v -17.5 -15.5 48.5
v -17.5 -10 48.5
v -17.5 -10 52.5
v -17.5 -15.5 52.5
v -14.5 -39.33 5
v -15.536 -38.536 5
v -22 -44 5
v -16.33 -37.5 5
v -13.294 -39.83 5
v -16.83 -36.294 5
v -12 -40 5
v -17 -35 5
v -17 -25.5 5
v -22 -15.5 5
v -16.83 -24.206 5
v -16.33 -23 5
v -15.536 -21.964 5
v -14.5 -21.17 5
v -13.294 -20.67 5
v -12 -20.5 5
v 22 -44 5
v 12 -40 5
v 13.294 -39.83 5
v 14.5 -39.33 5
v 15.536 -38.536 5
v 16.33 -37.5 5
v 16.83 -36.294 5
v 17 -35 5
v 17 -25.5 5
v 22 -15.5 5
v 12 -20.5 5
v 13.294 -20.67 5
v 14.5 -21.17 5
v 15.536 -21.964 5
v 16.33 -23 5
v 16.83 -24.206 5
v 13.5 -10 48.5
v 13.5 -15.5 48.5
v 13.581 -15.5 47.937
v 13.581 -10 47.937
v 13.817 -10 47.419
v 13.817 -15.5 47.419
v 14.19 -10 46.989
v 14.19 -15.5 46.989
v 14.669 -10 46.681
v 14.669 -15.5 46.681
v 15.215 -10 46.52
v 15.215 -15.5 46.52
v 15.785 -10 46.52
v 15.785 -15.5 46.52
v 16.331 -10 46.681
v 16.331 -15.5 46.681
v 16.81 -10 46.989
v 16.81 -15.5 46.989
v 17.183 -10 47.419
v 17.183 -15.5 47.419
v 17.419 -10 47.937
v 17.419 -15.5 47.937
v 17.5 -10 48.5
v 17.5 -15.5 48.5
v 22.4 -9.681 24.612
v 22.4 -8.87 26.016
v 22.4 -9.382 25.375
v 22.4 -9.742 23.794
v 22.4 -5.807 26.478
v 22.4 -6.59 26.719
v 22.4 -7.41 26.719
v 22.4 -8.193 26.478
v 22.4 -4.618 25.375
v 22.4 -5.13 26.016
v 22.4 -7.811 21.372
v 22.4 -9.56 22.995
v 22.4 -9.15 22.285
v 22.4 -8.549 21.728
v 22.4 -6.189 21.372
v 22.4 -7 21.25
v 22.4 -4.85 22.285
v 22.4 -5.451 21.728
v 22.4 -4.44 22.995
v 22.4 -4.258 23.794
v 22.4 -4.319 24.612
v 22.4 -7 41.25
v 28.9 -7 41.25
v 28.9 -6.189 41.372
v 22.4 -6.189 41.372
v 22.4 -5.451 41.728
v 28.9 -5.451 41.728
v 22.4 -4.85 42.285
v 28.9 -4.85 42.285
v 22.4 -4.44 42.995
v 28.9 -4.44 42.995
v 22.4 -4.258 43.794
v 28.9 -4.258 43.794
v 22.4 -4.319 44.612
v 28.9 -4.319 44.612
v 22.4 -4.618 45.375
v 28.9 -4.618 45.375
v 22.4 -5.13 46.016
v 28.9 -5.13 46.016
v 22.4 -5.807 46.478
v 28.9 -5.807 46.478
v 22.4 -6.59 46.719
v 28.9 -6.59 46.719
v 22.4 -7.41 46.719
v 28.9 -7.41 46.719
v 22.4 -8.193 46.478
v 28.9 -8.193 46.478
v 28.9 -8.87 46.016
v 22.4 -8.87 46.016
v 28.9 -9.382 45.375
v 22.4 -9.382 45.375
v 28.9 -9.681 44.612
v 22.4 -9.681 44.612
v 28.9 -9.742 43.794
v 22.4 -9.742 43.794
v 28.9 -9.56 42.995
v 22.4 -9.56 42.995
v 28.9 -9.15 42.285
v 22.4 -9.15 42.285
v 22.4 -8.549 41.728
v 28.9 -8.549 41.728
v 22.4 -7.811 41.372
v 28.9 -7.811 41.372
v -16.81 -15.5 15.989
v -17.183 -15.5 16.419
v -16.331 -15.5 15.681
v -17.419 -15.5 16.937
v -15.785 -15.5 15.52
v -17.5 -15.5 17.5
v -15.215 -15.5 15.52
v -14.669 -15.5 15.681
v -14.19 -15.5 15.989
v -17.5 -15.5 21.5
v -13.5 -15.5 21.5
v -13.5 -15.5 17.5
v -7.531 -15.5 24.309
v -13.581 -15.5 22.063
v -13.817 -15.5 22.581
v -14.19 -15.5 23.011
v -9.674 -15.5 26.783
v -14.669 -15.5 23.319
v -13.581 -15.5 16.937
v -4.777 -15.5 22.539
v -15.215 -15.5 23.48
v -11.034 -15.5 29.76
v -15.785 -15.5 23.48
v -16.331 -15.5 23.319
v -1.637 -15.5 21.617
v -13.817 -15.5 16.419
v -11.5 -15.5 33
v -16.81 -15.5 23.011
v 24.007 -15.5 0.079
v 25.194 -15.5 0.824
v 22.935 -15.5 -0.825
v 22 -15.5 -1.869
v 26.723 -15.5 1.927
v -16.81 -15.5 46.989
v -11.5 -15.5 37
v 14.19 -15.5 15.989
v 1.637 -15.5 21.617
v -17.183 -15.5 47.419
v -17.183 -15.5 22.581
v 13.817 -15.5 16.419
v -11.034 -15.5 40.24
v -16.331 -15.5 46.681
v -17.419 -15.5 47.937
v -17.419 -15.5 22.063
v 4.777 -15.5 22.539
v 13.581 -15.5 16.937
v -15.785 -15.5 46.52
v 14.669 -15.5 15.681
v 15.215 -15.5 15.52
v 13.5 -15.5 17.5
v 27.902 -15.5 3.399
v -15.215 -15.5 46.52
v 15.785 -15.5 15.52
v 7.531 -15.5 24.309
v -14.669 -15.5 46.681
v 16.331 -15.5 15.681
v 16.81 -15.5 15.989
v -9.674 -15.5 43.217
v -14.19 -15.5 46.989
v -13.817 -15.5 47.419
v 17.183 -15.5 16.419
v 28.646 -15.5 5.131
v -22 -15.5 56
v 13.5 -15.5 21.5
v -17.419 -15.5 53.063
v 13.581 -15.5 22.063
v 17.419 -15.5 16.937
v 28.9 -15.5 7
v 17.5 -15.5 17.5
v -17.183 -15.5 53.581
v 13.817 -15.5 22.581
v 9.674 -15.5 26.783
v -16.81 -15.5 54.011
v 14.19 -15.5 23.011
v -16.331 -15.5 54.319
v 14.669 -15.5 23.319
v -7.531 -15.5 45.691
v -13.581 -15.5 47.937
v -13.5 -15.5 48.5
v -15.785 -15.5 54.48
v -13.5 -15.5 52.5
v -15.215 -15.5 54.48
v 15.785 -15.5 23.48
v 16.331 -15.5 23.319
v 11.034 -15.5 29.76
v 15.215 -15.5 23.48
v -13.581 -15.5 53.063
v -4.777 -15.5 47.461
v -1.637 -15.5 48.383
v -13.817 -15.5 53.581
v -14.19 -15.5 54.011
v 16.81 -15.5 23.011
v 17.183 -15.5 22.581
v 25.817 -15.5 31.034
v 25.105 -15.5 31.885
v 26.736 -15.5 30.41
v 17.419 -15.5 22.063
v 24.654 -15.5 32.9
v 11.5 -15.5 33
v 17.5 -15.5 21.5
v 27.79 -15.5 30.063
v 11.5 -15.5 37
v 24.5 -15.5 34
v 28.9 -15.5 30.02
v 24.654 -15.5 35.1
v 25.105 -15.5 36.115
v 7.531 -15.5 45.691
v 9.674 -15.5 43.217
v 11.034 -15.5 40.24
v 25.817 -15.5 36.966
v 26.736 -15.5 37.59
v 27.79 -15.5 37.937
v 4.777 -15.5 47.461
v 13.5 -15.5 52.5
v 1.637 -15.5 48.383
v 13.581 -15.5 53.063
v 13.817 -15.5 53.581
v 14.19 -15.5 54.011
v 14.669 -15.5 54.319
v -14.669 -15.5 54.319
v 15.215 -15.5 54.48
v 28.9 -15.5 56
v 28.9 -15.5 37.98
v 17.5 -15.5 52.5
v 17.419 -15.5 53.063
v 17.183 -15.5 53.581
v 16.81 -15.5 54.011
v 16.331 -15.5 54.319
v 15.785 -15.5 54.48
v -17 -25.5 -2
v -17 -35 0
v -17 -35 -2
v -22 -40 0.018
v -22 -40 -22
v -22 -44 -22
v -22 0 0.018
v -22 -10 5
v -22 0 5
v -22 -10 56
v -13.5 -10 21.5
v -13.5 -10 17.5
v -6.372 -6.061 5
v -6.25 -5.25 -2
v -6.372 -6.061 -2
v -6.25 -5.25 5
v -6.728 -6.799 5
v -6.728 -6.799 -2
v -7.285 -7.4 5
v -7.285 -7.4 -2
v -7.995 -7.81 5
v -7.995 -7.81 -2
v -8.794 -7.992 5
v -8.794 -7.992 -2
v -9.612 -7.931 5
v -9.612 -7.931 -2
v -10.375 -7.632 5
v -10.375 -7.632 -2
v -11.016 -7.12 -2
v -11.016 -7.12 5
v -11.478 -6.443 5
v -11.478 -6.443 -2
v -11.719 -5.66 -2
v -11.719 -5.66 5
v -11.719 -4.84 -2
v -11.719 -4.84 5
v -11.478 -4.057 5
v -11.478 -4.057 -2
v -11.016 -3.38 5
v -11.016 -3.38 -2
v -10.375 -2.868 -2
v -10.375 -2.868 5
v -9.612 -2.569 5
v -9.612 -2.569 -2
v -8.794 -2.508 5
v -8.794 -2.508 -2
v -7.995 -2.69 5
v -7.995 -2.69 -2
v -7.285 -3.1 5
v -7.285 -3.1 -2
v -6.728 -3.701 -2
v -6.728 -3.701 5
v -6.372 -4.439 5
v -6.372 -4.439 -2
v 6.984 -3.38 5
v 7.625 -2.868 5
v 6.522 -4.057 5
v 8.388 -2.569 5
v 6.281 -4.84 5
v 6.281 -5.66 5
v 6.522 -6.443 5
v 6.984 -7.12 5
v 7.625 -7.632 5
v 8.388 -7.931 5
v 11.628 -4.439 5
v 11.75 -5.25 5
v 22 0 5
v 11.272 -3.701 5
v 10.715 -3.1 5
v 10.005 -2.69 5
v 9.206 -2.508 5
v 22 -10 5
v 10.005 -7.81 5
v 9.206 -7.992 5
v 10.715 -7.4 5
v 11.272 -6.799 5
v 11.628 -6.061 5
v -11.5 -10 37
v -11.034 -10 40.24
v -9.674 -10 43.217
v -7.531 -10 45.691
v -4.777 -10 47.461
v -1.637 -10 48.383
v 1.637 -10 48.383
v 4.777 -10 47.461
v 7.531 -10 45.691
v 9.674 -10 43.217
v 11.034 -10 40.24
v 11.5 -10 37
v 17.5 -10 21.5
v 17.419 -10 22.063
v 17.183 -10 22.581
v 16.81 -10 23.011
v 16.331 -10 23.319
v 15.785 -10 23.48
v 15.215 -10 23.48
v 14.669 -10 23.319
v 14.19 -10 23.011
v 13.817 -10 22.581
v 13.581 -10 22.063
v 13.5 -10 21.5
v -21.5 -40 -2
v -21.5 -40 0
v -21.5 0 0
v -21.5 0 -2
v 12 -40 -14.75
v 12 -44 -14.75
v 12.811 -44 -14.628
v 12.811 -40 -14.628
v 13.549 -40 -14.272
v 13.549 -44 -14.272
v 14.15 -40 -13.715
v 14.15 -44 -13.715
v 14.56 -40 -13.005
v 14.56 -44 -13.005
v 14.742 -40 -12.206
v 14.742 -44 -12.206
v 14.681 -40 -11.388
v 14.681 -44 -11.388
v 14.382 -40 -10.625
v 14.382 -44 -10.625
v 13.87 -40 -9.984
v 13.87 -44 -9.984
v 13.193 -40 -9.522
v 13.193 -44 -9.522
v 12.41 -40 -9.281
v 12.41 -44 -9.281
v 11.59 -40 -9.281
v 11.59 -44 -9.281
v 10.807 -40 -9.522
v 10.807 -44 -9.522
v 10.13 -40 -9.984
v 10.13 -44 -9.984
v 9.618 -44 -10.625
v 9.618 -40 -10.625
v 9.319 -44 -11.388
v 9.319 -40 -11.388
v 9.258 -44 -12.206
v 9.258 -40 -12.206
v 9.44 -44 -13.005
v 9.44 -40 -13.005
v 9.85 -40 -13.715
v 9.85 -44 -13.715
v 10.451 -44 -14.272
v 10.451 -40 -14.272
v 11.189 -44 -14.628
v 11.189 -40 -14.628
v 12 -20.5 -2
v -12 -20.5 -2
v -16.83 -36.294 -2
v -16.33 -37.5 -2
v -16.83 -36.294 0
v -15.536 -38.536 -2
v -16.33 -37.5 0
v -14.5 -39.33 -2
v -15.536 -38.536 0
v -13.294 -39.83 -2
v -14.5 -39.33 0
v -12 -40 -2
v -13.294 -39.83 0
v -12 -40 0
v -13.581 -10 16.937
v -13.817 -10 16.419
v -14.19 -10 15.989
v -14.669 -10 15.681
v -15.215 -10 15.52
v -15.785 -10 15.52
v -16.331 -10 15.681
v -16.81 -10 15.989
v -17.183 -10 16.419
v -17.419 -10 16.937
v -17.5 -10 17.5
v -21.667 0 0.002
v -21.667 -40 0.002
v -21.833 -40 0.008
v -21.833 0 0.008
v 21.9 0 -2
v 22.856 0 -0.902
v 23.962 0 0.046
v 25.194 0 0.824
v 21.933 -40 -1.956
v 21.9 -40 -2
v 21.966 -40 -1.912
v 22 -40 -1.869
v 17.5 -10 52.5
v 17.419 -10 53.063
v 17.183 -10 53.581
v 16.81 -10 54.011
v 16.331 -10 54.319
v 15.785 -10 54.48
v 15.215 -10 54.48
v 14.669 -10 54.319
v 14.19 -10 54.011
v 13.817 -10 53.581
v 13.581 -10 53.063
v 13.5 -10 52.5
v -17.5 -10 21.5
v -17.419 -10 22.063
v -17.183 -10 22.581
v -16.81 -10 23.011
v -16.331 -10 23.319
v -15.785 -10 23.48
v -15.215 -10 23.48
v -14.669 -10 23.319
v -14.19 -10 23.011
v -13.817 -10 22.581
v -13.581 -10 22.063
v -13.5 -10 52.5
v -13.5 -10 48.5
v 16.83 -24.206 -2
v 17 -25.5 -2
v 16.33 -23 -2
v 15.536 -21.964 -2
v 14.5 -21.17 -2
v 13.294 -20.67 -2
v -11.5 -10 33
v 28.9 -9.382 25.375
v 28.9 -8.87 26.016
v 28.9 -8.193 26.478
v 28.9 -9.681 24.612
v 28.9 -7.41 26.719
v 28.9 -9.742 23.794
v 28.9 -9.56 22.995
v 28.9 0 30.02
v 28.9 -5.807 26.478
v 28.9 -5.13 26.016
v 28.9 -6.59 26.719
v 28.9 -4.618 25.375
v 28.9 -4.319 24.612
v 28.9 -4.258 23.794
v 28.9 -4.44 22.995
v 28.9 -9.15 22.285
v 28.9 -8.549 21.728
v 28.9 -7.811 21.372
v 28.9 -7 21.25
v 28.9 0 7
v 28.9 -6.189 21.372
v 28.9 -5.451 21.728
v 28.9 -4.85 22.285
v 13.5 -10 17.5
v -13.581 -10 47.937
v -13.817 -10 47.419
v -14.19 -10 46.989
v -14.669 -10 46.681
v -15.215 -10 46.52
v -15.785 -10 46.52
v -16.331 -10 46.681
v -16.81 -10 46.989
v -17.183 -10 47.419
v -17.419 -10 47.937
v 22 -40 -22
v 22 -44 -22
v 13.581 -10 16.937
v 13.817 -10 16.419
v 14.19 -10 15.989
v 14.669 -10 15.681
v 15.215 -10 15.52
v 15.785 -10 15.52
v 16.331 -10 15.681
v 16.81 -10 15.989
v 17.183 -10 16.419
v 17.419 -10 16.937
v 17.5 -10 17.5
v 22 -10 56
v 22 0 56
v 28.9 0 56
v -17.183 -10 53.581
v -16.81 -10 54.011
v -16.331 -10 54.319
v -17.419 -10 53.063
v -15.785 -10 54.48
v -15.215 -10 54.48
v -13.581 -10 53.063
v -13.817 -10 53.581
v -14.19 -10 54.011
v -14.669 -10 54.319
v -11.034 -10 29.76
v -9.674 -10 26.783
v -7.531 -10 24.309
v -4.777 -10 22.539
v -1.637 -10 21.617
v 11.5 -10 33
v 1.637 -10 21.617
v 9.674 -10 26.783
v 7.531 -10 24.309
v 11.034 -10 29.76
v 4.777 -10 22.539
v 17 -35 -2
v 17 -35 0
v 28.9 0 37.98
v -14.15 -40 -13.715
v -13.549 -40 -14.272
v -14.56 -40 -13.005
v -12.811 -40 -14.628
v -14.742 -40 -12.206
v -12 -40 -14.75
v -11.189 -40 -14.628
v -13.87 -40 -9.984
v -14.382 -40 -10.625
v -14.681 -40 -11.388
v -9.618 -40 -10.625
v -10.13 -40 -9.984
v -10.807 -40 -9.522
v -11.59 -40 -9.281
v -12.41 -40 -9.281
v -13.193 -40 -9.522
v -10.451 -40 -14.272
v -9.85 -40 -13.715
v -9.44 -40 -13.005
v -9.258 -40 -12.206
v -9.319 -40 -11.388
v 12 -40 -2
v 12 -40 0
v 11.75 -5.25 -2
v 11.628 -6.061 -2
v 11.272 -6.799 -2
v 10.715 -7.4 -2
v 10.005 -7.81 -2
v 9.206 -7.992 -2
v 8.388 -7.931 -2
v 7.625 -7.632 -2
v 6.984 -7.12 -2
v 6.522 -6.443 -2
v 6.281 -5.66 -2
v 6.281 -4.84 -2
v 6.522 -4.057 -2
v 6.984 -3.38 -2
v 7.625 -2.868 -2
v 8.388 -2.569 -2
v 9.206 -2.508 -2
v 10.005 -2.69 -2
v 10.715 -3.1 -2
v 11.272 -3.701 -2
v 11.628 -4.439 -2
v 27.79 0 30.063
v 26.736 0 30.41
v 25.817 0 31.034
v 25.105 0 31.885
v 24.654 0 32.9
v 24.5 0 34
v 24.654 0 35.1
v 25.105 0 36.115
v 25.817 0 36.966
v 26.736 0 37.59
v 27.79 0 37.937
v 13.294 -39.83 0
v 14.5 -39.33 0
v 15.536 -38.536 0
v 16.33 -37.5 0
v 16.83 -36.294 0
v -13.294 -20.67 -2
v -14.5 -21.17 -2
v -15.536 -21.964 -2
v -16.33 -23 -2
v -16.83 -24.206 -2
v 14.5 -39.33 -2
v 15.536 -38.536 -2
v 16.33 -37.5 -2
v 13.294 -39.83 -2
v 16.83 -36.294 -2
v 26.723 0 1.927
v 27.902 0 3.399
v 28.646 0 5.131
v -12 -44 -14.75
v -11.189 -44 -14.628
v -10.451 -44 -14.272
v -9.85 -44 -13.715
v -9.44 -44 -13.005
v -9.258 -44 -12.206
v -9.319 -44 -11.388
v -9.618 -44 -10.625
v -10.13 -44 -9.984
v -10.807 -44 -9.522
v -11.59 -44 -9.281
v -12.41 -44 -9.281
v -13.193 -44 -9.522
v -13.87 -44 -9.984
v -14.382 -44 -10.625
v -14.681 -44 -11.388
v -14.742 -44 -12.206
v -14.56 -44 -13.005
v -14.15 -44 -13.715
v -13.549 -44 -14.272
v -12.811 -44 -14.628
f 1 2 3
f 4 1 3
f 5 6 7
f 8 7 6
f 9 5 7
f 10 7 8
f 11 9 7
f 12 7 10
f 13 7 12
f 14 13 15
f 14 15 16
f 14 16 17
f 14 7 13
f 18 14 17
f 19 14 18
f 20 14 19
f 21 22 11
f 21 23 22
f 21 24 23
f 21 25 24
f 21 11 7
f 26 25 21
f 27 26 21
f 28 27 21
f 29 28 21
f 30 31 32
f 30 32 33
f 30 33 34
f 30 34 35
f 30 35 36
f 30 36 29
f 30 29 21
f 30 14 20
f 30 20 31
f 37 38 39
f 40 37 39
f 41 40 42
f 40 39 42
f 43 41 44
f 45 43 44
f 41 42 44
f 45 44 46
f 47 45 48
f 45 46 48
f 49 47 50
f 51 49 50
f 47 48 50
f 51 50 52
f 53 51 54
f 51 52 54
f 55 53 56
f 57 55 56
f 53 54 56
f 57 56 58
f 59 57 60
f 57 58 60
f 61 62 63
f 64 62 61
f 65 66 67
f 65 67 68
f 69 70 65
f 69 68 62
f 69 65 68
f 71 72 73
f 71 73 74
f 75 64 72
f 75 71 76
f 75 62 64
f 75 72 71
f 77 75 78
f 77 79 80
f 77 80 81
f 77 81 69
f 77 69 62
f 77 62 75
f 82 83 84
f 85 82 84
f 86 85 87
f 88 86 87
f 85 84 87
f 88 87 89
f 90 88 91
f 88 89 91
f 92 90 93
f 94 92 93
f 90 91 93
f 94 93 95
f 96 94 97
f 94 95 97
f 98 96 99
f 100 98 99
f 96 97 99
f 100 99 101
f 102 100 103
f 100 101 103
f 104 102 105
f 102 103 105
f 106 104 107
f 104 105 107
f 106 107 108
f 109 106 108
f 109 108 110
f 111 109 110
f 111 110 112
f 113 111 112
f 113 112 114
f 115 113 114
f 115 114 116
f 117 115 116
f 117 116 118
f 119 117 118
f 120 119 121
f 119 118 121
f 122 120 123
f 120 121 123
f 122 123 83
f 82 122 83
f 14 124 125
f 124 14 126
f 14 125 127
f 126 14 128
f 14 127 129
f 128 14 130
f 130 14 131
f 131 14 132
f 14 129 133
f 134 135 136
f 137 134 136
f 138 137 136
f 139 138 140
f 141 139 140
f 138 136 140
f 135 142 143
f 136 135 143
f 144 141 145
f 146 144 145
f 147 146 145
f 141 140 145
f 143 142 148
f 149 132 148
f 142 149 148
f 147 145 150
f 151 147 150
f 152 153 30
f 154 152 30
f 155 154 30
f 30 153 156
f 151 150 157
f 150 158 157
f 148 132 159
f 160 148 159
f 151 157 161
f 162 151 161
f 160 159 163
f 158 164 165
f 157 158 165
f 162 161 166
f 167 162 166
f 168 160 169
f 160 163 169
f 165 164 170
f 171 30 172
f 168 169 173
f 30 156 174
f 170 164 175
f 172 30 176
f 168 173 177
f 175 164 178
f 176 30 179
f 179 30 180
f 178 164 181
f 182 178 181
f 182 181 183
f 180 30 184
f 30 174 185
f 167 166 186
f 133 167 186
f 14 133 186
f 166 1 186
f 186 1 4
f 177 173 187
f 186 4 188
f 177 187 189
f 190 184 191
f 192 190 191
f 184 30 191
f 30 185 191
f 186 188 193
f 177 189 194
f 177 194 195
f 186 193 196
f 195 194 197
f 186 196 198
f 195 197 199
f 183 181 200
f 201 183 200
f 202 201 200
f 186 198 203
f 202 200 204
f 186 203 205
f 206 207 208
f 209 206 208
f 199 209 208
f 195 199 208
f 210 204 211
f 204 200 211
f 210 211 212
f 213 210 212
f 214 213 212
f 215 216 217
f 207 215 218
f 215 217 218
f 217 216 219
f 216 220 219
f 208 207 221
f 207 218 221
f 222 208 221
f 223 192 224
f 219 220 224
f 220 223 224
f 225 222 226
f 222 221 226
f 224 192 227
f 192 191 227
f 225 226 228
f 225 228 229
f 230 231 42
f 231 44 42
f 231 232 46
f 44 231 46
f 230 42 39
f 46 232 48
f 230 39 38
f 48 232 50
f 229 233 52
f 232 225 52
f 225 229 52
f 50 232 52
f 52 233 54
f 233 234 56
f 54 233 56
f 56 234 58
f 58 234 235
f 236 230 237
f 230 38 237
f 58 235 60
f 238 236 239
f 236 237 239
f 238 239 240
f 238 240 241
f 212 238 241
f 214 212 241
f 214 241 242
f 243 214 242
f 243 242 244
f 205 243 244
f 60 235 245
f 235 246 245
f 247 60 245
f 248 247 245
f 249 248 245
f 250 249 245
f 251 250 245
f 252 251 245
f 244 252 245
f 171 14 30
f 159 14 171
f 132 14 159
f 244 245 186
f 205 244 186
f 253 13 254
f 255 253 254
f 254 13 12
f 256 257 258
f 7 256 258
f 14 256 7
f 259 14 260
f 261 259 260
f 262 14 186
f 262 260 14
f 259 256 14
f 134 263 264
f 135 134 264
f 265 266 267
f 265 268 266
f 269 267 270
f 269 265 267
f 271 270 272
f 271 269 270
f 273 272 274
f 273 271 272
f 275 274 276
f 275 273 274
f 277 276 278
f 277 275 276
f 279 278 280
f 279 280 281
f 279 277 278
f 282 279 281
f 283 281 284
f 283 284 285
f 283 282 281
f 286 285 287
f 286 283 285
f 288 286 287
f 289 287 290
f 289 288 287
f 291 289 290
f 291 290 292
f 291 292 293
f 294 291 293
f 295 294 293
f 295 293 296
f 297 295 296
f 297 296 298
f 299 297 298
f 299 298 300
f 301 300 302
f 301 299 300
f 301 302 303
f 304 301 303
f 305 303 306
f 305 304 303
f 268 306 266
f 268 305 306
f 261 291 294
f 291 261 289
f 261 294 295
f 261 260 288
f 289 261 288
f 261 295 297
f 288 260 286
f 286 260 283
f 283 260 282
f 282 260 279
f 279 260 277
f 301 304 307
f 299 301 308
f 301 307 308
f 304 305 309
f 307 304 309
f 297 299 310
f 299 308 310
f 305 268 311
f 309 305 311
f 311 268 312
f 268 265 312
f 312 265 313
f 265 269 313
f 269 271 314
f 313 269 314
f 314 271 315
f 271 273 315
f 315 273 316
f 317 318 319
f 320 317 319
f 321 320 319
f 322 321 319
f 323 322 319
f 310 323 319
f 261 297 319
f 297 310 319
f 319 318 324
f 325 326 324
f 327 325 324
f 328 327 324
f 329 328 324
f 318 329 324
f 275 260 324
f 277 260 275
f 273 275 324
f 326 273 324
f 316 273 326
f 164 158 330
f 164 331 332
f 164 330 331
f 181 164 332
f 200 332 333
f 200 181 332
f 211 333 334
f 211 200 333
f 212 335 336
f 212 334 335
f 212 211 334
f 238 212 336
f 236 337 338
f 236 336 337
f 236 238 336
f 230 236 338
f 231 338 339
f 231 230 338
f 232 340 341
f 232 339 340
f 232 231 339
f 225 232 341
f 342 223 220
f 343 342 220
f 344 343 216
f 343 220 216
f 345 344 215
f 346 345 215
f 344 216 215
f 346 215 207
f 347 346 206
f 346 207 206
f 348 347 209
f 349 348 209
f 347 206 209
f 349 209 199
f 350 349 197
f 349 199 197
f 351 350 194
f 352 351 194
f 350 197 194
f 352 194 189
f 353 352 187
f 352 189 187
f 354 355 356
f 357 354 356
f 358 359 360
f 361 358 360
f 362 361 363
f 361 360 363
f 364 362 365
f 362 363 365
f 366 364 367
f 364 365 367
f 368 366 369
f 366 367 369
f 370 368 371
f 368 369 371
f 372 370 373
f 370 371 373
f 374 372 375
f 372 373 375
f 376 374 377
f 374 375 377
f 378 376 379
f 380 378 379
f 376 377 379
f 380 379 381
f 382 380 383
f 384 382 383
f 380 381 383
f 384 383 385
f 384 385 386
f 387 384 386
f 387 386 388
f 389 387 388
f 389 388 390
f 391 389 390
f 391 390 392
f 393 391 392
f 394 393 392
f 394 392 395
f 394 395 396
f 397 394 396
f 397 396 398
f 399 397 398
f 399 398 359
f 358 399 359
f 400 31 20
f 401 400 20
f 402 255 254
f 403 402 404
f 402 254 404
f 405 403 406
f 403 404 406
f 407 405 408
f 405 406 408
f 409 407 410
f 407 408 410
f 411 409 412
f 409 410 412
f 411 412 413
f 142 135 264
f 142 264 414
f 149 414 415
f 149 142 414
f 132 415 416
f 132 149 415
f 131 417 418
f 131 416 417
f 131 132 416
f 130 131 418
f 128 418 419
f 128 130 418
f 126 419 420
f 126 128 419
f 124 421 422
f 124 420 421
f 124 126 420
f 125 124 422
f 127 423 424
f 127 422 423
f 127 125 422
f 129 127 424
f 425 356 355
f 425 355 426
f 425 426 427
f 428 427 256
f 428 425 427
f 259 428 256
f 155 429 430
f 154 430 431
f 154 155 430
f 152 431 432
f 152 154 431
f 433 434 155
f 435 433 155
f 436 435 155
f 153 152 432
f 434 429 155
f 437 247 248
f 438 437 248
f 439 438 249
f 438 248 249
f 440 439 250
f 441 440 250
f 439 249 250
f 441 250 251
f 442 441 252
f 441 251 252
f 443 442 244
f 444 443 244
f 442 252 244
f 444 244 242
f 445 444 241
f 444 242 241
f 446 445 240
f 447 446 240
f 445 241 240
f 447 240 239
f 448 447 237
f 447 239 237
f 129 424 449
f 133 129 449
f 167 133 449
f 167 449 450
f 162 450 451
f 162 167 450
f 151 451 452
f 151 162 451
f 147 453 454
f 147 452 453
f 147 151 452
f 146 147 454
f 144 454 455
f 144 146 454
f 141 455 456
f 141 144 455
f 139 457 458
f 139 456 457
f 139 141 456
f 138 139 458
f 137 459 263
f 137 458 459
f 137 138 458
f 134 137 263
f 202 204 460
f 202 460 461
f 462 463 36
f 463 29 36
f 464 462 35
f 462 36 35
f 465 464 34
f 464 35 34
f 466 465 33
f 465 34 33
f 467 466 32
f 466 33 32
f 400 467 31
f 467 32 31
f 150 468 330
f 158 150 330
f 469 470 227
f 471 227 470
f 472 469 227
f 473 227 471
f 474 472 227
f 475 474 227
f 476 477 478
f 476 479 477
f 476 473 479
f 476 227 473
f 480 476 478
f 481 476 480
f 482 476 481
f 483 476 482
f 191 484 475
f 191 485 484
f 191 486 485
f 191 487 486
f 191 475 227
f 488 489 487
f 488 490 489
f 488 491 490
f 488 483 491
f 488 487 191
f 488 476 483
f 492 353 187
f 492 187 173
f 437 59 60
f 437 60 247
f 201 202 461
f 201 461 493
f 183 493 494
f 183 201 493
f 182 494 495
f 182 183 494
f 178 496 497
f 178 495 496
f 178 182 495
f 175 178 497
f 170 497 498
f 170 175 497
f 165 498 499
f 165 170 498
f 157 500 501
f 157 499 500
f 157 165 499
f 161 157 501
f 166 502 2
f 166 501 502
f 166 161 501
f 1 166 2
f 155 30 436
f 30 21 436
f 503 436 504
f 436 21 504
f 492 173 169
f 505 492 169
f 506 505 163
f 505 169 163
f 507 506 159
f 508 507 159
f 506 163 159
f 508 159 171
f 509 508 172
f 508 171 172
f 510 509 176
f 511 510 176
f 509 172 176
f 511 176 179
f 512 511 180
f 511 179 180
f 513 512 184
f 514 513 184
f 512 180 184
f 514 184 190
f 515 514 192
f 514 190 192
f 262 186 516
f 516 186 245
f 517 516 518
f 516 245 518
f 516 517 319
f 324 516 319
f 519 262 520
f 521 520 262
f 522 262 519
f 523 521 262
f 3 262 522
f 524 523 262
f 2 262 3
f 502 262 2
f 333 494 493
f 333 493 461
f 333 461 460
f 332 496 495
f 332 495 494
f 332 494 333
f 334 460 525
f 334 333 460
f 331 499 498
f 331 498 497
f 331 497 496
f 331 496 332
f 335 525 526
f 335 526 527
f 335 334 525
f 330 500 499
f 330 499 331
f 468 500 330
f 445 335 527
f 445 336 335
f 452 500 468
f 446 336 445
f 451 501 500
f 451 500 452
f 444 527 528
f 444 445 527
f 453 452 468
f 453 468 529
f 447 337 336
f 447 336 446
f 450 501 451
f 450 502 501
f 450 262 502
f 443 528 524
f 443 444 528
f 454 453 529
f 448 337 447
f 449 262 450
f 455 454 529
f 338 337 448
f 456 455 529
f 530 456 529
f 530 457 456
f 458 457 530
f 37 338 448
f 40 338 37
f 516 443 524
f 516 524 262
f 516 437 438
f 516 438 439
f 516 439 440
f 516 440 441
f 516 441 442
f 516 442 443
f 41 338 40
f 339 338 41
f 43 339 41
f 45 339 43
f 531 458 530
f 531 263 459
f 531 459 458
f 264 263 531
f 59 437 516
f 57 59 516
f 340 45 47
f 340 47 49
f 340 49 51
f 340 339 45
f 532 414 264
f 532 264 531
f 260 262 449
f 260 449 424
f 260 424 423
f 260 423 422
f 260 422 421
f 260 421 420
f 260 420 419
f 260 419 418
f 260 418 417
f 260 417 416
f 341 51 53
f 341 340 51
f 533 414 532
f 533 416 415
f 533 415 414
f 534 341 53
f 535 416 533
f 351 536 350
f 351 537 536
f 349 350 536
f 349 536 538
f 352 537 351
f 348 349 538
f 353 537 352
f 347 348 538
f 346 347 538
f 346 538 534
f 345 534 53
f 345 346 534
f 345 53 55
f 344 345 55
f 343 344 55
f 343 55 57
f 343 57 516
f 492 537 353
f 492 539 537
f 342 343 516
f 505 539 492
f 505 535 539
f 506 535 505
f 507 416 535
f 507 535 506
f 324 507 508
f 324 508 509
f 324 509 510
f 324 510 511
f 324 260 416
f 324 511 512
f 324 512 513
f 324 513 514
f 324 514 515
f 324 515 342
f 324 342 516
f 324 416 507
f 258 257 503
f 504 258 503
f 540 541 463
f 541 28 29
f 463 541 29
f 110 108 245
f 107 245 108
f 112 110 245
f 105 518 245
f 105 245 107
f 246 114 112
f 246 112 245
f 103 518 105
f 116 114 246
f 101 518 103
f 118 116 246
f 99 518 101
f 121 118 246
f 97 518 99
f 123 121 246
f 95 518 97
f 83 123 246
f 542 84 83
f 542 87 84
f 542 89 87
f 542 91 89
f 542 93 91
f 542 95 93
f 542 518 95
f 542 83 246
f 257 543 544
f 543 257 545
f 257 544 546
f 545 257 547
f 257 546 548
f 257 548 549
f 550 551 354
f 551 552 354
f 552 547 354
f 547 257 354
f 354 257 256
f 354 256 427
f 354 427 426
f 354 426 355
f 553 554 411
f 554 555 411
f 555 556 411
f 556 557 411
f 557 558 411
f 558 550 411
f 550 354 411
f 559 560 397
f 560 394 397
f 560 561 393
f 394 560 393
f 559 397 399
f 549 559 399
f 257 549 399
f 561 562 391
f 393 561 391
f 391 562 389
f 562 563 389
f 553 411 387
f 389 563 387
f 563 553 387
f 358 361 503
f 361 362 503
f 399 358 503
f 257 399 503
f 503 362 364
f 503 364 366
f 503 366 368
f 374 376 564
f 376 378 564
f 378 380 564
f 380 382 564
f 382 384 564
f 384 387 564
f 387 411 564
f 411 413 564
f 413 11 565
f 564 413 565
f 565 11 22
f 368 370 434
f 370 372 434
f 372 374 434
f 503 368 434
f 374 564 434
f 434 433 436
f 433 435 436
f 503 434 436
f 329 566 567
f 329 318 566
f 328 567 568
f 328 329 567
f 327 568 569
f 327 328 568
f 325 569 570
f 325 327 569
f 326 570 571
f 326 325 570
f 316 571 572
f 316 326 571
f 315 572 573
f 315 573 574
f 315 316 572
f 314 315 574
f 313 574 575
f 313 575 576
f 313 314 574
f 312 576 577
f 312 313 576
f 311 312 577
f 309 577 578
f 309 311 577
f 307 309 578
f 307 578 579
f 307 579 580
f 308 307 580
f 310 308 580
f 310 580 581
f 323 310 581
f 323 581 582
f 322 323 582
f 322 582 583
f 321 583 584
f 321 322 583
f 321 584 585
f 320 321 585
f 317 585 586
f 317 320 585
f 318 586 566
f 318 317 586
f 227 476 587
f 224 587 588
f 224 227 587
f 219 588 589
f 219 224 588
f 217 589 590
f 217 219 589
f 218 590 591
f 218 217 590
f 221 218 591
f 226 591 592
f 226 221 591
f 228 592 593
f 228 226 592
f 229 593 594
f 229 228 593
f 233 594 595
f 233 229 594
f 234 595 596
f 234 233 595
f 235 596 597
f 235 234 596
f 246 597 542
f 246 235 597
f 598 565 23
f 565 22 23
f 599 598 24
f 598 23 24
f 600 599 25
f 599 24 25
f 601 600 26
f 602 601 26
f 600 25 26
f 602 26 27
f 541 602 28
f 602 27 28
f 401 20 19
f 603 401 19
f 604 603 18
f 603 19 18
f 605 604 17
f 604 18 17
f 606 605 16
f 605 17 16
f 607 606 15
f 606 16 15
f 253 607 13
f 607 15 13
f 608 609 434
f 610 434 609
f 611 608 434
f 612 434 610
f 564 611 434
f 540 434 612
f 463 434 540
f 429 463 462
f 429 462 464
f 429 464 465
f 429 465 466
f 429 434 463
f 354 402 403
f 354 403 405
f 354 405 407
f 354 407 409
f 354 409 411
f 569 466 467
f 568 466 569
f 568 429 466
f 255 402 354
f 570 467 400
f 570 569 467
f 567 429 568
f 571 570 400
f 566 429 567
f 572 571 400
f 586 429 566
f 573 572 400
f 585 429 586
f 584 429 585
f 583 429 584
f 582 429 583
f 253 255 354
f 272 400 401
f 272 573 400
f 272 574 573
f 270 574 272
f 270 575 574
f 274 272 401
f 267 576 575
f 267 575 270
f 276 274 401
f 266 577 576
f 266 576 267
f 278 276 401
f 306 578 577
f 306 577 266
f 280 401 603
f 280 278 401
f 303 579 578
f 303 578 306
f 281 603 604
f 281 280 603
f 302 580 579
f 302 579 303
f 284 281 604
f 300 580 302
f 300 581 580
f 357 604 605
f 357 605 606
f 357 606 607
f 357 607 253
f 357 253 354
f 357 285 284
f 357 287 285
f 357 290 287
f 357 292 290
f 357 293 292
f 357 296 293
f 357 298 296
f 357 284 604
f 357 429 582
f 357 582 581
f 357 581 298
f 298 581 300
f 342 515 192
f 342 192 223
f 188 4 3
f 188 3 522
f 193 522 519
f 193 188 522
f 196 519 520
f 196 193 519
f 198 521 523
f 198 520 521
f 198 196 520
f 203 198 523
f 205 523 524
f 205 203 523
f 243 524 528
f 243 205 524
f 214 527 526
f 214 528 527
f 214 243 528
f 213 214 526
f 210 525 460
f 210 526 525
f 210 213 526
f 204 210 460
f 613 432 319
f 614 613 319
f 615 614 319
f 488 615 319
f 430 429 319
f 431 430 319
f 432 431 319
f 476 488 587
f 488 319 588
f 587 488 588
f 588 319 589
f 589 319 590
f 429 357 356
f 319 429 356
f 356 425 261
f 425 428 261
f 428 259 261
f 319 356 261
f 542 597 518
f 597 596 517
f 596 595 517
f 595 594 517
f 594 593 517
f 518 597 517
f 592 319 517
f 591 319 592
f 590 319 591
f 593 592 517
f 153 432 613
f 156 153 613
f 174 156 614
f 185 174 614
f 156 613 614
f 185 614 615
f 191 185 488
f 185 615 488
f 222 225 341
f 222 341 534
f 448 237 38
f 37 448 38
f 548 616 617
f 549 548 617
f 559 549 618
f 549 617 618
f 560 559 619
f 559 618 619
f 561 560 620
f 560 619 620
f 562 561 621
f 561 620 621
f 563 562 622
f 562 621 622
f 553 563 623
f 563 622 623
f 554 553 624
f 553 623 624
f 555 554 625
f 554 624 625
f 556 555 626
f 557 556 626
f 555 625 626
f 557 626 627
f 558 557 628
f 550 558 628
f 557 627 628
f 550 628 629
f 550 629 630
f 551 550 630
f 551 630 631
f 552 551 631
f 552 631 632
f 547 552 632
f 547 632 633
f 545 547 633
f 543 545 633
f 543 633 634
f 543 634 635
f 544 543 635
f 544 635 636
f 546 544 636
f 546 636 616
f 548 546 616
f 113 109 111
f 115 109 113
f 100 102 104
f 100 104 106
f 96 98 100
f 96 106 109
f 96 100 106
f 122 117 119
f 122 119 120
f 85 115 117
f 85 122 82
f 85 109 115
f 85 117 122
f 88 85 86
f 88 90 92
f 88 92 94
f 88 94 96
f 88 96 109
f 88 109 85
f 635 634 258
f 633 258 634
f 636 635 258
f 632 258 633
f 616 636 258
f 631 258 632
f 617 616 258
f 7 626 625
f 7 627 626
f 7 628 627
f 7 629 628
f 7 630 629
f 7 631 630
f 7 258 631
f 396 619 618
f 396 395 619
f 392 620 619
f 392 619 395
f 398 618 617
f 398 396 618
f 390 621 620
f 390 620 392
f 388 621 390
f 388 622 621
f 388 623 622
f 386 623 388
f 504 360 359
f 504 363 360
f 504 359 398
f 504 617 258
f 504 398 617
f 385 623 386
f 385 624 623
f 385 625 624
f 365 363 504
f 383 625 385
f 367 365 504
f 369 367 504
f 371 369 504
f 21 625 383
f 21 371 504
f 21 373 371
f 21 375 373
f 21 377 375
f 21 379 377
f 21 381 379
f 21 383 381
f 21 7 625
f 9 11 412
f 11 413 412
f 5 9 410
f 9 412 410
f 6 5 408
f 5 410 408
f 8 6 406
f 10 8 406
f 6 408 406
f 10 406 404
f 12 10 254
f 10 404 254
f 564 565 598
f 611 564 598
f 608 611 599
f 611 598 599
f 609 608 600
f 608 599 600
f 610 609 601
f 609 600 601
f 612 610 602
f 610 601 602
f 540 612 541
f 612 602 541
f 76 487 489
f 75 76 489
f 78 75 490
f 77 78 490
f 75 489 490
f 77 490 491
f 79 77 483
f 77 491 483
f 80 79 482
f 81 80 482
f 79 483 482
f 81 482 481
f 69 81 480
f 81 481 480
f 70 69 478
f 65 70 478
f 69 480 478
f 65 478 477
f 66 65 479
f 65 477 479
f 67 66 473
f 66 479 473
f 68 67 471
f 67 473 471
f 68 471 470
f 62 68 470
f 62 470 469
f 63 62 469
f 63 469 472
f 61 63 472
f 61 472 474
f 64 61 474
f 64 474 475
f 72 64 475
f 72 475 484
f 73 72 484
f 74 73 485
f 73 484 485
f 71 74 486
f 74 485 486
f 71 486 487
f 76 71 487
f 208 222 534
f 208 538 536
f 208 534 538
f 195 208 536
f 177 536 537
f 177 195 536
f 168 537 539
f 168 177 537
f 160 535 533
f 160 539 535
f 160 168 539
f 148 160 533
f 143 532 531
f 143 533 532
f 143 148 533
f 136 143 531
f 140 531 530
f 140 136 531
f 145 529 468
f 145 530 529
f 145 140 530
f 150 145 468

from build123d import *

# Parameters (mm, degrees)
BOSS_EXTRUDE1_DEPTH      = 42
BOSS_EXTRUDE1_DEPTH_BACK = 42
SKETCH2_R                = 2.75
SKETCH2_W                = 15
SKETCH2_H                = 2.5
CUT_EXTRUDE1_DEPTH       = 100.161484458
SKETCH3_R                = 4
SKETCH3_W                = 15
SKETCH3_H                = 60
CUT_EXTRUDE2_DEPTH       = 101.743486312
SKETCH4_W                = 44
SKETCH4_H                = 46.5
CUT_EXTRUDE3_DEPTH       = 60
CUT_EXTRUDE4_DEPTH       = 10
CUT_EXTRUDE4_DEPTH_BACK  = 10
SKETCH5_W                = 44
SKETCH5_H                = 51
SKETCH6_R                = 2.75
CUT_EXTRUDE5_DEPTH       = 4.6
SKETCH7_W                = 15
SKETCH7_H                = 62
CUT_EXTRUDE6_DEPTH       = 63
SKETCH8_W                = 54
SKETCH8_H                = 22
CUT_EXTRUDE7_DEPTH       = 63
SKETCH9_W                = 54
SKETCH9_H                = 27
BOSS_EXTRUDE2_DEPTH      = 4
FILLET1_R                = 5
SKETCH12_W               = 5
SKETCH12_H               = 11.450523872
BOSS_EXTRUDE4_DEPTH      = 4
CUT_EXTRUDE8_START       = -113
SKETCH13_R               = 65
CUT_EXTRUDE8_DEPTH       = 113
SKETCH14_R               = 2.75
CUT_EXTRUDE9_DEPTH       = 15
SKETCH15_R               = 2.75
CUT_EXTRUDE10_DEPTH      = 15
SKETCH16_W               = 5
SKETCH16_H               = 46.5
CUT_EXTRUDE11_DEPTH      = 90
SKETCH17_W               = 9
SKETCH17_H               = 18
CUT_EXTRUDE12_DEPTH      = 90
SKETCH23_W               = 56
SKETCH23_H               = 15.5
BOSS_EXTRUDE10_DEPTH     = 6.9
SKETCH18_W               = 56
SKETCH18_H               = 15.5
SKETCH18_R               = 2.75
BOSS_EXTRUDE5_DEPTH      = 6.5
SKETCH19_R               = 4
CUT_EXTRUDE13_DEPTH      = 36
FILLET2_R                = 7
FILLET5_R                = 7
SKETCH24_R               = 2.75
CUT_EXTRUDE14_DEPTH      = 6.5
SKETCH26_W               = 56
SKETCH26_H               = 15.5
CUT_EXTRUDE15_DEPTH      = 6.5
SKETCH27_R               = 2.75
BOSS_EXTRUDE11_DEPTH     = 2
FILLET6_R                = 10


with BuildPart() as part:
    # Sketch1 → Boss-Extrude1 (new, two sides: drawn at the far end of the back side and taken through both)
    with BuildSketch(Plane(origin=(0, 0, 0), x_dir=(0, 0, -1), z_dir=(1, 0, 0)).offset(-BOSS_EXTRUDE1_DEPTH_BACK)):
        with BuildLine():
            Line((0, 0), (0, -62))
            Line((0, -62), (-5, -62))
            ThreePointArc((-5, -62), (-27.506882202, -29.081460906), (-65, -15.5))
            Line((-65, -15.5), (-65, 2.5))
            Line((-65, 2.5), (-56, 2.5))
            ThreePointArc((-56, 2.5), (-30.901836055, -6.947455525), (-5, 0))
            Line((-5, 0), (0, 0))
        make_face()
    extrude(amount=BOSS_EXTRUDE1_DEPTH + BOSS_EXTRUDE1_DEPTH_BACK)

    # Sketch2 → Cut-Extrude1 (cut, through all)
    with BuildSketch(Plane(origin=(0, 0, 0), x_dir=(-1, 0, 0), z_dir=(0, 0, -1))):
        with Locations(Location((-36, -6, 0), (0, 0, 90))):
            Circle(SKETCH2_R)
        with BuildLine():
            ThreePointArc((-42, -53.6792), (-32.778829166, -31), (-42, -8.3208))
            Line((-42, -8.3208), (-42, -53.6792))
        make_face()
        with BuildLine():
            ThreePointArc((-17, -25.5), (-15.535533906, -21.964466094), (-12, -20.5))
            Line((-12, -20.5), (12, -20.5))
            ThreePointArc((12, -20.5), (15.535533906, -21.964466094), (17, -25.5))
            Line((17, -25.5), (17, -49))
            ThreePointArc((17, -49), (15.535533906, -52.535533906), (12, -54))
            Line((12, -54), (-12, -54))
            ThreePointArc((-12, -54), (-15.535533906, -52.535533906), (-17, -49))
            Line((-17, -49), (-17, -25.5))
        make_face()
        with Locations(Location((-36, -56, 0), (0, 0, 90))):
            Circle(SKETCH2_R)
        with Locations(Location((36, -56, 0), (0, 0, 90))):
            Circle(SKETCH2_R)
        with Locations(Location((36, -6, 0), (0, 0, 90))):
            Circle(SKETCH2_R)
        with Locations((34.5, 1.25)):
            Rectangle(SKETCH2_W, SKETCH2_H)
        with Locations((-34.5, 1.25)):
            Rectangle(SKETCH2_W, SKETCH2_H)
        with BuildLine():
            Line((42, -53.6792), (42, -8.3208))
            ThreePointArc((42, -8.3208), (32.778829166, -31), (42, -53.6792))
        make_face()
    extrude(amount=-CUT_EXTRUDE1_DEPTH, mode=Mode.SUBTRACT)

    # Sketch3 → Cut-Extrude2 (cut, through all)
    with BuildSketch(Plane(origin=(0, -62, 0), x_dir=(-1, 0, 0), z_dir=(0, -1, 0))):
        with Locations((0, -65)):
            Circle(SKETCH3_R)
        with Locations((34.5, -35)):
            Rectangle(SKETCH3_W, SKETCH3_H)
        with Locations((-34.5, -35)):
            Rectangle(SKETCH3_W, SKETCH3_H)
        with BuildLine():
            Line((11.5, -33), (11.5, -37))
            ThreePointArc((11.5, -37), (0, -48.5), (-11.5, -37))
            Line((-11.5, -37), (-11.5, -33))
            ThreePointArc((-11.5, -33), (0, -21.5), (11.5, -33))
        make_face()
        with BuildLine():
            Line((17.5, -48.5), (17.5, -52.5))
            ThreePointArc((17.5, -52.5), (15.5, -54.5), (13.5, -52.5))
            Line((13.5, -52.5), (13.5, -48.5))
            ThreePointArc((13.5, -48.5), (15.5, -46.5), (17.5, -48.5))
        make_face()
        with BuildLine():
            Line((17.5, -17.5), (17.5, -21.5))
            ThreePointArc((17.5, -21.5), (15.5, -23.5), (13.5, -21.5))
            Line((13.5, -21.5), (13.5, -17.5))
            ThreePointArc((13.5, -17.5), (15.5, -15.5), (17.5, -17.5))
        make_face()
        with BuildLine():
            Line((-17.5, -17.5), (-17.5, -21.5))
            ThreePointArc((-17.5, -21.5), (-15.5, -23.5), (-13.5, -21.5))
            Line((-13.5, -21.5), (-13.5, -17.5))
            ThreePointArc((-13.5, -17.5), (-15.5, -15.5), (-17.5, -17.5))
        make_face()
        with BuildLine():
            Line((-17.5, -48.5), (-17.5, -52.5))
            ThreePointArc((-17.5, -52.5), (-15.5, -54.5), (-13.5, -52.5))
            Line((-13.5, -52.5), (-13.5, -48.5))
            ThreePointArc((-13.5, -48.5), (-15.5, -46.5), (-17.5, -48.5))
        make_face()
    extrude(amount=-CUT_EXTRUDE2_DEPTH, mode=Mode.SUBTRACT)

    # Sketch4 → Cut-Extrude3 (cut)
    with BuildSketch(Plane.XY.offset(65)):
        with Locations((0, -38.75)):
            Rectangle(SKETCH4_W, SKETCH4_H)
    extrude(amount=-CUT_EXTRUDE3_DEPTH, mode=Mode.SUBTRACT)

    # Sketch5 → Cut-Extrude4 (cut, two sides: drawn at the far end of the back side and taken through both)
    with BuildSketch(Plane(origin=(0, 0, 0), x_dir=(1, 0, 0), z_dir=(0, 1, 0)).offset(-CUT_EXTRUDE4_DEPTH_BACK)):
        with Locations((0, -30.5)):
            Rectangle(SKETCH5_W, SKETCH5_H)
    extrude(amount=CUT_EXTRUDE4_DEPTH + CUT_EXTRUDE4_DEPTH_BACK, mode=Mode.SUBTRACT)

    # Sketch6 → Cut-Extrude5 (cut)
    with BuildSketch(Plane.XY.offset(65)):
        with Locations((-10, -5.5)):
            Circle(SKETCH6_R)
        with Locations((10, -5.5)):
            Circle(SKETCH6_R)
    extrude(amount=-CUT_EXTRUDE5_DEPTH, mode=Mode.SUBTRACT)

    # Sketch7 → Cut-Extrude6 (cut)
    with BuildSketch(Plane.XY.offset(5)):
        with Locations((34.5, -31)):
            Rectangle(SKETCH7_W, SKETCH7_H)
        with Locations((-34.5, -31)):
            Rectangle(SKETCH7_W, SKETCH7_H)
    extrude(amount=-CUT_EXTRUDE6_DEPTH, mode=Mode.SUBTRACT)

    # Sketch8 → Cut-Extrude7 (cut)
    with BuildSketch(Plane(origin=(0, 0, 0), x_dir=(-1, 0, 0), z_dir=(0, 0, -1))):
        with Locations((0, -51)):
            Rectangle(SKETCH8_W, SKETCH8_H)
    extrude(amount=-CUT_EXTRUDE7_DEPTH, mode=Mode.SUBTRACT)

    # Sketch9 → Boss-Extrude2 (add)
    with BuildSketch(Plane.XZ.offset(40)):
        with Locations((0, -8.5)):
            Rectangle(SKETCH9_W, SKETCH9_H)
    extrude(amount=BOSS_EXTRUDE2_DEPTH)

    # Fillet1
    fillet1_edges = [part.edges().sort_by_distance(p)[0] for p in [
        (17, -40, 2.5),
        (-17, -40, 2.5),
    ]]
    fillet(fillet1_edges, radius=FILLET1_R)

    # Sketch12 → Boss-Extrude4 (add)
    with BuildSketch(Plane.XZ.offset(40)):
        with Locations((-24.5, 10.725261936)):
            Rectangle(SKETCH12_W, SKETCH12_H)
        with Locations((24.5, 10.725261936)):
            Rectangle(SKETCH12_W, SKETCH12_H)
    extrude(amount=BOSS_EXTRUDE4_DEPTH)

    # Sketch13 → Cut-Extrude8 (cut)
    with BuildSketch(Plane(origin=(27, 0, 0), x_dir=(0, 0, -1), z_dir=(1, 0, 0)).offset(CUT_EXTRUDE8_START)):
        with Locations((-67.324040456, -80.458439297)):
            Circle(SKETCH13_R)
    extrude(amount=CUT_EXTRUDE8_DEPTH, mode=Mode.SUBTRACT)

    # Sketch14 → Cut-Extrude9 (cut)
    with BuildSketch(Plane.XZ.offset(44)):
        with Locations(Location((12, -12, 0), (0, 0, 270))):
            Circle(SKETCH14_R)
        with Locations(Location((-12, -12, 0), (0, 0, 270))):
            Circle(SKETCH14_R)
    extrude(amount=-CUT_EXTRUDE9_DEPTH, mode=Mode.SUBTRACT)

    # Sketch15 → Cut-Extrude10 (cut)
    with BuildSketch(Plane.XY.offset(5)):
        with Locations((9, -5.25)):
            Circle(SKETCH15_R)
        with Locations((-9, -5.25)):
            Circle(SKETCH15_R)
    extrude(amount=-CUT_EXTRUDE10_DEPTH, mode=Mode.SUBTRACT)

    # Sketch16 → Cut-Extrude11 (cut)
    with BuildSketch(Plane.XY.offset(65)):
        with Locations((-24.5, -20.75)):
            Rectangle(SKETCH16_W, SKETCH16_H)
        with Locations((24.5, -20.75)):
            Rectangle(SKETCH16_W, SKETCH16_H)
    extrude(amount=-CUT_EXTRUDE11_DEPTH, mode=Mode.SUBTRACT)

    # Sketch17 → Cut-Extrude12 (cut)
    with BuildSketch(Plane.ZY.offset(22)):
        with Locations((60.5, -6.5)):
            Rectangle(SKETCH17_W, SKETCH17_H)
    extrude(amount=-CUT_EXTRUDE12_DEPTH, mode=Mode.SUBTRACT)

    # Sketch23 → Boss-Extrude10 (add)
    with BuildSketch(Plane(origin=(22, 0, 0), x_dir=(0, 0, -1), z_dir=(1, 0, 0))):
        with Locations((-28, -7.75)):
            Rectangle(SKETCH23_W, SKETCH23_H)
    extrude(amount=BOSS_EXTRUDE10_DEPTH)

    # Sketch18 → Boss-Extrude5 (add)
    with BuildSketch(Plane.ZY.offset(22)):
        with Locations((28, -7.75)):
            Rectangle(SKETCH18_W, SKETCH18_H)
        with Locations(Location((24, -7.25, 0), (0, 0, 270))):
            Circle(SKETCH18_R, mode=Mode.SUBTRACT)
        with Locations(Location((44, -7.25, 0), (0, 0, 270))):
            Circle(SKETCH18_R, mode=Mode.SUBTRACT)
    extrude(amount=BOSS_EXTRUDE5_DEPTH)

    # Sketch19 → Cut-Extrude13 (cut)
    with BuildSketch(Plane.XZ.offset(15.5)):
        with Locations((-28.5, 34)):
            Circle(SKETCH19_R)
    cut_extrude13 = extrude(amount=-CUT_EXTRUDE13_DEPTH, mode=Mode.SUBTRACT)

    # Fillet2
    fillet2_edges = [part.edges().sort_by_distance(p)[0] for p in [
        (-28.5, -7.75, 0),
    ]]
    fillet(fillet2_edges, radius=FILLET2_R)

    # Mirror5: Cut-Extrude13 across plane
    add(cut_extrude13.mirror(Plane(origin=(0, 0, 0), x_dir=(0, 0, 1), z_dir=(1, 0, 0))), mode=Mode.SUBTRACT)

    # Fillet5
    fillet5_edges = [part.edges().sort_by_distance(p)[0] for p in [
        (28.9, -7.75, 0),
    ]]
    fillet(fillet5_edges, radius=FILLET5_R)

    # Sketch24 → Cut-Extrude14 (cut)
    with BuildSketch(Plane(origin=(28.9, 0, 0), x_dir=(0, 0, -1), z_dir=(1, 0, 0))):
        with Locations((-44, -7)):
            Circle(SKETCH24_R)
        with Locations((-24, -7)):
            Circle(SKETCH24_R)
    extrude(amount=-CUT_EXTRUDE14_DEPTH, mode=Mode.SUBTRACT)

    # Sketch26 → Cut-Extrude15 (cut)
    with BuildSketch(Plane.ZY.offset(28.5)):
        with Locations((28, -7.75)):
            Rectangle(SKETCH26_W, SKETCH26_H)
    extrude(amount=-CUT_EXTRUDE15_DEPTH, mode=Mode.SUBTRACT)

    # Sketch27 → Boss-Extrude11 (add)
    with BuildSketch(Plane(origin=(0, 0, 0), x_dir=(-1, 0, 0), z_dir=(0, 0, -1))):
        with BuildLine():
            Line((21.5, -40), (21.5, 0))
            Line((21.5, 0), (-21.9, 0))
            Line((-21.9, 0), (-21.9, -40))
            Line((-21.9, -40), (-12, -40))
            ThreePointArc((-12, -40), (-15.535533906, -38.535533906), (-17, -35))
            Line((-17, -35), (-17, -25.5))
            ThreePointArc((-17, -25.5), (-15.535533906, -21.964466094), (-12, -20.5))
            Line((-12, -20.5), (12, -20.5))
            ThreePointArc((12, -20.5), (15.535533906, -21.964466094), (17, -25.5))
            Line((17, -25.5), (17, -35))
            ThreePointArc((17, -35), (15.535533906, -38.535533906), (12, -40))
            Line((12, -40), (21.5, -40))
        make_face()
        with Locations(Location((9, -5.25, 0), (0, 0, 180))):
            Circle(SKETCH27_R, mode=Mode.SUBTRACT)
        with Locations(Location((-9, -5.25, 0), (0, 0, 180))):
            Circle(SKETCH27_R, mode=Mode.SUBTRACT)
    extrude(amount=BOSS_EXTRUDE11_DEPTH)

    # Fillet6
    # the kernel refuses this fillet: 10 mm, written as the material it adds along each edge
    with BuildSketch(Plane(origin=(21.9, -40, 0), x_dir=(0, 0, -1), z_dir=(0, 1, 0))) as fillet6_piece_1_section:
        with BuildLine():
            CenterArc((8, -8), FILLET6_R, 126.869897646, 25.057615418)
            Line((-0.823529412, -3.294117647), (-1, -3.2))
            ThreePointArc((-1, -3.2), (-0.403030999, -1.64924225), (-0.2, 0))
            Line((-0.2, 0), (0, 0.2))
            ThreePointArc((0, 0.2), (1, 0.2), (1.88, 0.16))
            Line((1.88, 0.16), (2, 0))
        make_face()
    fillet6_piece_1 = extrude(amount=40, mode=Mode.PRIVATE)
    fillet6_piece_1 = split(fillet6_piece_1, bisect_by=Plane(origin=(22, -27.75, -0.877476934), z_dir=(-1, 0, 0)), keep=Keep.TOP, mode=Mode.PRIVATE)
    fillet6_piece_1 = split(fillet6_piece_1, bisect_by=Plane(origin=(21.85575196, -15.5, -0.877476934), z_dir=(0, -1, 0)), keep=Keep.TOP, mode=Mode.PRIVATE)
    add(fillet6_piece_1)
    with BuildSketch(Plane(origin=(21.9, -40, 0), x_dir=(0, 0, -1), z_dir=(0, 1, 0))) as fillet6_piece_2_section:
        with BuildLine():
            CenterArc((8, -8), FILLET6_R, 126.869897646, 25.057615418)
            Line((-0.823529412, -3.294117647), (-1, -3.2))
            ThreePointArc((-1, -3.2), (-0.403030999, -1.64924225), (-0.2, 0))
            Line((-0.2, 0), (0, 0.2))
            ThreePointArc((0, 0.2), (1, 0.2), (1.88, 0.16))
            Line((1.88, 0.16), (2, 0))
        make_face()
    fillet6_piece_2 = extrude(amount=40, mode=Mode.PRIVATE)
    fillet6_piece_2 = split(fillet6_piece_2, bisect_by=Plane(origin=(22, -7.75, -0.877476934), z_dir=(-1, 0, 0)), keep=Keep.TOP, mode=Mode.PRIVATE)
    fillet6_piece_2 = split(fillet6_piece_2, bisect_by=Plane(origin=(21.85575196, -15.5, -0.877476934), z_dir=(0, 1, 0)), keep=Keep.TOP, mode=Mode.PRIVATE)
    add(fillet6_piece_2)
    with BuildSketch(Plane(origin=(21.9, -40, 0), x_dir=(0, 0, -1), z_dir=(0, 1, 0))) as fillet6_piece_3_section:
        with BuildLine():
            CenterArc((8, -8), FILLET6_R, 126.869897646, 25.057615418)
            Line((-0.823529412, -3.294117647), (-1, -3.2))
            ThreePointArc((-1, -3.2), (-0.403030999, -1.64924225), (-0.2, 0))
            Line((-0.2, 0), (0, 0.2))
            ThreePointArc((0, 0.2), (1, 0.2), (1.88, 0.16))
            Line((1.88, 0.16), (2, 0))
        make_face()
    fillet6_piece_3 = extrude(amount=40, mode=Mode.PRIVATE)
    fillet6_piece_3 = split(fillet6_piece_3, bisect_by=Plane(origin=(22, -7.75, -0.252980479), z_dir=(1, 0, 0)), keep=Keep.TOP, mode=Mode.PRIVATE)
    fillet6_piece_3 = split(fillet6_piece_3, bisect_by=Plane(origin=(22.996225297, -15.5, -0.252980479), z_dir=(0, 1, 0)), keep=Keep.TOP, mode=Mode.PRIVATE)
    add(fillet6_piece_3)


solid = part.part
